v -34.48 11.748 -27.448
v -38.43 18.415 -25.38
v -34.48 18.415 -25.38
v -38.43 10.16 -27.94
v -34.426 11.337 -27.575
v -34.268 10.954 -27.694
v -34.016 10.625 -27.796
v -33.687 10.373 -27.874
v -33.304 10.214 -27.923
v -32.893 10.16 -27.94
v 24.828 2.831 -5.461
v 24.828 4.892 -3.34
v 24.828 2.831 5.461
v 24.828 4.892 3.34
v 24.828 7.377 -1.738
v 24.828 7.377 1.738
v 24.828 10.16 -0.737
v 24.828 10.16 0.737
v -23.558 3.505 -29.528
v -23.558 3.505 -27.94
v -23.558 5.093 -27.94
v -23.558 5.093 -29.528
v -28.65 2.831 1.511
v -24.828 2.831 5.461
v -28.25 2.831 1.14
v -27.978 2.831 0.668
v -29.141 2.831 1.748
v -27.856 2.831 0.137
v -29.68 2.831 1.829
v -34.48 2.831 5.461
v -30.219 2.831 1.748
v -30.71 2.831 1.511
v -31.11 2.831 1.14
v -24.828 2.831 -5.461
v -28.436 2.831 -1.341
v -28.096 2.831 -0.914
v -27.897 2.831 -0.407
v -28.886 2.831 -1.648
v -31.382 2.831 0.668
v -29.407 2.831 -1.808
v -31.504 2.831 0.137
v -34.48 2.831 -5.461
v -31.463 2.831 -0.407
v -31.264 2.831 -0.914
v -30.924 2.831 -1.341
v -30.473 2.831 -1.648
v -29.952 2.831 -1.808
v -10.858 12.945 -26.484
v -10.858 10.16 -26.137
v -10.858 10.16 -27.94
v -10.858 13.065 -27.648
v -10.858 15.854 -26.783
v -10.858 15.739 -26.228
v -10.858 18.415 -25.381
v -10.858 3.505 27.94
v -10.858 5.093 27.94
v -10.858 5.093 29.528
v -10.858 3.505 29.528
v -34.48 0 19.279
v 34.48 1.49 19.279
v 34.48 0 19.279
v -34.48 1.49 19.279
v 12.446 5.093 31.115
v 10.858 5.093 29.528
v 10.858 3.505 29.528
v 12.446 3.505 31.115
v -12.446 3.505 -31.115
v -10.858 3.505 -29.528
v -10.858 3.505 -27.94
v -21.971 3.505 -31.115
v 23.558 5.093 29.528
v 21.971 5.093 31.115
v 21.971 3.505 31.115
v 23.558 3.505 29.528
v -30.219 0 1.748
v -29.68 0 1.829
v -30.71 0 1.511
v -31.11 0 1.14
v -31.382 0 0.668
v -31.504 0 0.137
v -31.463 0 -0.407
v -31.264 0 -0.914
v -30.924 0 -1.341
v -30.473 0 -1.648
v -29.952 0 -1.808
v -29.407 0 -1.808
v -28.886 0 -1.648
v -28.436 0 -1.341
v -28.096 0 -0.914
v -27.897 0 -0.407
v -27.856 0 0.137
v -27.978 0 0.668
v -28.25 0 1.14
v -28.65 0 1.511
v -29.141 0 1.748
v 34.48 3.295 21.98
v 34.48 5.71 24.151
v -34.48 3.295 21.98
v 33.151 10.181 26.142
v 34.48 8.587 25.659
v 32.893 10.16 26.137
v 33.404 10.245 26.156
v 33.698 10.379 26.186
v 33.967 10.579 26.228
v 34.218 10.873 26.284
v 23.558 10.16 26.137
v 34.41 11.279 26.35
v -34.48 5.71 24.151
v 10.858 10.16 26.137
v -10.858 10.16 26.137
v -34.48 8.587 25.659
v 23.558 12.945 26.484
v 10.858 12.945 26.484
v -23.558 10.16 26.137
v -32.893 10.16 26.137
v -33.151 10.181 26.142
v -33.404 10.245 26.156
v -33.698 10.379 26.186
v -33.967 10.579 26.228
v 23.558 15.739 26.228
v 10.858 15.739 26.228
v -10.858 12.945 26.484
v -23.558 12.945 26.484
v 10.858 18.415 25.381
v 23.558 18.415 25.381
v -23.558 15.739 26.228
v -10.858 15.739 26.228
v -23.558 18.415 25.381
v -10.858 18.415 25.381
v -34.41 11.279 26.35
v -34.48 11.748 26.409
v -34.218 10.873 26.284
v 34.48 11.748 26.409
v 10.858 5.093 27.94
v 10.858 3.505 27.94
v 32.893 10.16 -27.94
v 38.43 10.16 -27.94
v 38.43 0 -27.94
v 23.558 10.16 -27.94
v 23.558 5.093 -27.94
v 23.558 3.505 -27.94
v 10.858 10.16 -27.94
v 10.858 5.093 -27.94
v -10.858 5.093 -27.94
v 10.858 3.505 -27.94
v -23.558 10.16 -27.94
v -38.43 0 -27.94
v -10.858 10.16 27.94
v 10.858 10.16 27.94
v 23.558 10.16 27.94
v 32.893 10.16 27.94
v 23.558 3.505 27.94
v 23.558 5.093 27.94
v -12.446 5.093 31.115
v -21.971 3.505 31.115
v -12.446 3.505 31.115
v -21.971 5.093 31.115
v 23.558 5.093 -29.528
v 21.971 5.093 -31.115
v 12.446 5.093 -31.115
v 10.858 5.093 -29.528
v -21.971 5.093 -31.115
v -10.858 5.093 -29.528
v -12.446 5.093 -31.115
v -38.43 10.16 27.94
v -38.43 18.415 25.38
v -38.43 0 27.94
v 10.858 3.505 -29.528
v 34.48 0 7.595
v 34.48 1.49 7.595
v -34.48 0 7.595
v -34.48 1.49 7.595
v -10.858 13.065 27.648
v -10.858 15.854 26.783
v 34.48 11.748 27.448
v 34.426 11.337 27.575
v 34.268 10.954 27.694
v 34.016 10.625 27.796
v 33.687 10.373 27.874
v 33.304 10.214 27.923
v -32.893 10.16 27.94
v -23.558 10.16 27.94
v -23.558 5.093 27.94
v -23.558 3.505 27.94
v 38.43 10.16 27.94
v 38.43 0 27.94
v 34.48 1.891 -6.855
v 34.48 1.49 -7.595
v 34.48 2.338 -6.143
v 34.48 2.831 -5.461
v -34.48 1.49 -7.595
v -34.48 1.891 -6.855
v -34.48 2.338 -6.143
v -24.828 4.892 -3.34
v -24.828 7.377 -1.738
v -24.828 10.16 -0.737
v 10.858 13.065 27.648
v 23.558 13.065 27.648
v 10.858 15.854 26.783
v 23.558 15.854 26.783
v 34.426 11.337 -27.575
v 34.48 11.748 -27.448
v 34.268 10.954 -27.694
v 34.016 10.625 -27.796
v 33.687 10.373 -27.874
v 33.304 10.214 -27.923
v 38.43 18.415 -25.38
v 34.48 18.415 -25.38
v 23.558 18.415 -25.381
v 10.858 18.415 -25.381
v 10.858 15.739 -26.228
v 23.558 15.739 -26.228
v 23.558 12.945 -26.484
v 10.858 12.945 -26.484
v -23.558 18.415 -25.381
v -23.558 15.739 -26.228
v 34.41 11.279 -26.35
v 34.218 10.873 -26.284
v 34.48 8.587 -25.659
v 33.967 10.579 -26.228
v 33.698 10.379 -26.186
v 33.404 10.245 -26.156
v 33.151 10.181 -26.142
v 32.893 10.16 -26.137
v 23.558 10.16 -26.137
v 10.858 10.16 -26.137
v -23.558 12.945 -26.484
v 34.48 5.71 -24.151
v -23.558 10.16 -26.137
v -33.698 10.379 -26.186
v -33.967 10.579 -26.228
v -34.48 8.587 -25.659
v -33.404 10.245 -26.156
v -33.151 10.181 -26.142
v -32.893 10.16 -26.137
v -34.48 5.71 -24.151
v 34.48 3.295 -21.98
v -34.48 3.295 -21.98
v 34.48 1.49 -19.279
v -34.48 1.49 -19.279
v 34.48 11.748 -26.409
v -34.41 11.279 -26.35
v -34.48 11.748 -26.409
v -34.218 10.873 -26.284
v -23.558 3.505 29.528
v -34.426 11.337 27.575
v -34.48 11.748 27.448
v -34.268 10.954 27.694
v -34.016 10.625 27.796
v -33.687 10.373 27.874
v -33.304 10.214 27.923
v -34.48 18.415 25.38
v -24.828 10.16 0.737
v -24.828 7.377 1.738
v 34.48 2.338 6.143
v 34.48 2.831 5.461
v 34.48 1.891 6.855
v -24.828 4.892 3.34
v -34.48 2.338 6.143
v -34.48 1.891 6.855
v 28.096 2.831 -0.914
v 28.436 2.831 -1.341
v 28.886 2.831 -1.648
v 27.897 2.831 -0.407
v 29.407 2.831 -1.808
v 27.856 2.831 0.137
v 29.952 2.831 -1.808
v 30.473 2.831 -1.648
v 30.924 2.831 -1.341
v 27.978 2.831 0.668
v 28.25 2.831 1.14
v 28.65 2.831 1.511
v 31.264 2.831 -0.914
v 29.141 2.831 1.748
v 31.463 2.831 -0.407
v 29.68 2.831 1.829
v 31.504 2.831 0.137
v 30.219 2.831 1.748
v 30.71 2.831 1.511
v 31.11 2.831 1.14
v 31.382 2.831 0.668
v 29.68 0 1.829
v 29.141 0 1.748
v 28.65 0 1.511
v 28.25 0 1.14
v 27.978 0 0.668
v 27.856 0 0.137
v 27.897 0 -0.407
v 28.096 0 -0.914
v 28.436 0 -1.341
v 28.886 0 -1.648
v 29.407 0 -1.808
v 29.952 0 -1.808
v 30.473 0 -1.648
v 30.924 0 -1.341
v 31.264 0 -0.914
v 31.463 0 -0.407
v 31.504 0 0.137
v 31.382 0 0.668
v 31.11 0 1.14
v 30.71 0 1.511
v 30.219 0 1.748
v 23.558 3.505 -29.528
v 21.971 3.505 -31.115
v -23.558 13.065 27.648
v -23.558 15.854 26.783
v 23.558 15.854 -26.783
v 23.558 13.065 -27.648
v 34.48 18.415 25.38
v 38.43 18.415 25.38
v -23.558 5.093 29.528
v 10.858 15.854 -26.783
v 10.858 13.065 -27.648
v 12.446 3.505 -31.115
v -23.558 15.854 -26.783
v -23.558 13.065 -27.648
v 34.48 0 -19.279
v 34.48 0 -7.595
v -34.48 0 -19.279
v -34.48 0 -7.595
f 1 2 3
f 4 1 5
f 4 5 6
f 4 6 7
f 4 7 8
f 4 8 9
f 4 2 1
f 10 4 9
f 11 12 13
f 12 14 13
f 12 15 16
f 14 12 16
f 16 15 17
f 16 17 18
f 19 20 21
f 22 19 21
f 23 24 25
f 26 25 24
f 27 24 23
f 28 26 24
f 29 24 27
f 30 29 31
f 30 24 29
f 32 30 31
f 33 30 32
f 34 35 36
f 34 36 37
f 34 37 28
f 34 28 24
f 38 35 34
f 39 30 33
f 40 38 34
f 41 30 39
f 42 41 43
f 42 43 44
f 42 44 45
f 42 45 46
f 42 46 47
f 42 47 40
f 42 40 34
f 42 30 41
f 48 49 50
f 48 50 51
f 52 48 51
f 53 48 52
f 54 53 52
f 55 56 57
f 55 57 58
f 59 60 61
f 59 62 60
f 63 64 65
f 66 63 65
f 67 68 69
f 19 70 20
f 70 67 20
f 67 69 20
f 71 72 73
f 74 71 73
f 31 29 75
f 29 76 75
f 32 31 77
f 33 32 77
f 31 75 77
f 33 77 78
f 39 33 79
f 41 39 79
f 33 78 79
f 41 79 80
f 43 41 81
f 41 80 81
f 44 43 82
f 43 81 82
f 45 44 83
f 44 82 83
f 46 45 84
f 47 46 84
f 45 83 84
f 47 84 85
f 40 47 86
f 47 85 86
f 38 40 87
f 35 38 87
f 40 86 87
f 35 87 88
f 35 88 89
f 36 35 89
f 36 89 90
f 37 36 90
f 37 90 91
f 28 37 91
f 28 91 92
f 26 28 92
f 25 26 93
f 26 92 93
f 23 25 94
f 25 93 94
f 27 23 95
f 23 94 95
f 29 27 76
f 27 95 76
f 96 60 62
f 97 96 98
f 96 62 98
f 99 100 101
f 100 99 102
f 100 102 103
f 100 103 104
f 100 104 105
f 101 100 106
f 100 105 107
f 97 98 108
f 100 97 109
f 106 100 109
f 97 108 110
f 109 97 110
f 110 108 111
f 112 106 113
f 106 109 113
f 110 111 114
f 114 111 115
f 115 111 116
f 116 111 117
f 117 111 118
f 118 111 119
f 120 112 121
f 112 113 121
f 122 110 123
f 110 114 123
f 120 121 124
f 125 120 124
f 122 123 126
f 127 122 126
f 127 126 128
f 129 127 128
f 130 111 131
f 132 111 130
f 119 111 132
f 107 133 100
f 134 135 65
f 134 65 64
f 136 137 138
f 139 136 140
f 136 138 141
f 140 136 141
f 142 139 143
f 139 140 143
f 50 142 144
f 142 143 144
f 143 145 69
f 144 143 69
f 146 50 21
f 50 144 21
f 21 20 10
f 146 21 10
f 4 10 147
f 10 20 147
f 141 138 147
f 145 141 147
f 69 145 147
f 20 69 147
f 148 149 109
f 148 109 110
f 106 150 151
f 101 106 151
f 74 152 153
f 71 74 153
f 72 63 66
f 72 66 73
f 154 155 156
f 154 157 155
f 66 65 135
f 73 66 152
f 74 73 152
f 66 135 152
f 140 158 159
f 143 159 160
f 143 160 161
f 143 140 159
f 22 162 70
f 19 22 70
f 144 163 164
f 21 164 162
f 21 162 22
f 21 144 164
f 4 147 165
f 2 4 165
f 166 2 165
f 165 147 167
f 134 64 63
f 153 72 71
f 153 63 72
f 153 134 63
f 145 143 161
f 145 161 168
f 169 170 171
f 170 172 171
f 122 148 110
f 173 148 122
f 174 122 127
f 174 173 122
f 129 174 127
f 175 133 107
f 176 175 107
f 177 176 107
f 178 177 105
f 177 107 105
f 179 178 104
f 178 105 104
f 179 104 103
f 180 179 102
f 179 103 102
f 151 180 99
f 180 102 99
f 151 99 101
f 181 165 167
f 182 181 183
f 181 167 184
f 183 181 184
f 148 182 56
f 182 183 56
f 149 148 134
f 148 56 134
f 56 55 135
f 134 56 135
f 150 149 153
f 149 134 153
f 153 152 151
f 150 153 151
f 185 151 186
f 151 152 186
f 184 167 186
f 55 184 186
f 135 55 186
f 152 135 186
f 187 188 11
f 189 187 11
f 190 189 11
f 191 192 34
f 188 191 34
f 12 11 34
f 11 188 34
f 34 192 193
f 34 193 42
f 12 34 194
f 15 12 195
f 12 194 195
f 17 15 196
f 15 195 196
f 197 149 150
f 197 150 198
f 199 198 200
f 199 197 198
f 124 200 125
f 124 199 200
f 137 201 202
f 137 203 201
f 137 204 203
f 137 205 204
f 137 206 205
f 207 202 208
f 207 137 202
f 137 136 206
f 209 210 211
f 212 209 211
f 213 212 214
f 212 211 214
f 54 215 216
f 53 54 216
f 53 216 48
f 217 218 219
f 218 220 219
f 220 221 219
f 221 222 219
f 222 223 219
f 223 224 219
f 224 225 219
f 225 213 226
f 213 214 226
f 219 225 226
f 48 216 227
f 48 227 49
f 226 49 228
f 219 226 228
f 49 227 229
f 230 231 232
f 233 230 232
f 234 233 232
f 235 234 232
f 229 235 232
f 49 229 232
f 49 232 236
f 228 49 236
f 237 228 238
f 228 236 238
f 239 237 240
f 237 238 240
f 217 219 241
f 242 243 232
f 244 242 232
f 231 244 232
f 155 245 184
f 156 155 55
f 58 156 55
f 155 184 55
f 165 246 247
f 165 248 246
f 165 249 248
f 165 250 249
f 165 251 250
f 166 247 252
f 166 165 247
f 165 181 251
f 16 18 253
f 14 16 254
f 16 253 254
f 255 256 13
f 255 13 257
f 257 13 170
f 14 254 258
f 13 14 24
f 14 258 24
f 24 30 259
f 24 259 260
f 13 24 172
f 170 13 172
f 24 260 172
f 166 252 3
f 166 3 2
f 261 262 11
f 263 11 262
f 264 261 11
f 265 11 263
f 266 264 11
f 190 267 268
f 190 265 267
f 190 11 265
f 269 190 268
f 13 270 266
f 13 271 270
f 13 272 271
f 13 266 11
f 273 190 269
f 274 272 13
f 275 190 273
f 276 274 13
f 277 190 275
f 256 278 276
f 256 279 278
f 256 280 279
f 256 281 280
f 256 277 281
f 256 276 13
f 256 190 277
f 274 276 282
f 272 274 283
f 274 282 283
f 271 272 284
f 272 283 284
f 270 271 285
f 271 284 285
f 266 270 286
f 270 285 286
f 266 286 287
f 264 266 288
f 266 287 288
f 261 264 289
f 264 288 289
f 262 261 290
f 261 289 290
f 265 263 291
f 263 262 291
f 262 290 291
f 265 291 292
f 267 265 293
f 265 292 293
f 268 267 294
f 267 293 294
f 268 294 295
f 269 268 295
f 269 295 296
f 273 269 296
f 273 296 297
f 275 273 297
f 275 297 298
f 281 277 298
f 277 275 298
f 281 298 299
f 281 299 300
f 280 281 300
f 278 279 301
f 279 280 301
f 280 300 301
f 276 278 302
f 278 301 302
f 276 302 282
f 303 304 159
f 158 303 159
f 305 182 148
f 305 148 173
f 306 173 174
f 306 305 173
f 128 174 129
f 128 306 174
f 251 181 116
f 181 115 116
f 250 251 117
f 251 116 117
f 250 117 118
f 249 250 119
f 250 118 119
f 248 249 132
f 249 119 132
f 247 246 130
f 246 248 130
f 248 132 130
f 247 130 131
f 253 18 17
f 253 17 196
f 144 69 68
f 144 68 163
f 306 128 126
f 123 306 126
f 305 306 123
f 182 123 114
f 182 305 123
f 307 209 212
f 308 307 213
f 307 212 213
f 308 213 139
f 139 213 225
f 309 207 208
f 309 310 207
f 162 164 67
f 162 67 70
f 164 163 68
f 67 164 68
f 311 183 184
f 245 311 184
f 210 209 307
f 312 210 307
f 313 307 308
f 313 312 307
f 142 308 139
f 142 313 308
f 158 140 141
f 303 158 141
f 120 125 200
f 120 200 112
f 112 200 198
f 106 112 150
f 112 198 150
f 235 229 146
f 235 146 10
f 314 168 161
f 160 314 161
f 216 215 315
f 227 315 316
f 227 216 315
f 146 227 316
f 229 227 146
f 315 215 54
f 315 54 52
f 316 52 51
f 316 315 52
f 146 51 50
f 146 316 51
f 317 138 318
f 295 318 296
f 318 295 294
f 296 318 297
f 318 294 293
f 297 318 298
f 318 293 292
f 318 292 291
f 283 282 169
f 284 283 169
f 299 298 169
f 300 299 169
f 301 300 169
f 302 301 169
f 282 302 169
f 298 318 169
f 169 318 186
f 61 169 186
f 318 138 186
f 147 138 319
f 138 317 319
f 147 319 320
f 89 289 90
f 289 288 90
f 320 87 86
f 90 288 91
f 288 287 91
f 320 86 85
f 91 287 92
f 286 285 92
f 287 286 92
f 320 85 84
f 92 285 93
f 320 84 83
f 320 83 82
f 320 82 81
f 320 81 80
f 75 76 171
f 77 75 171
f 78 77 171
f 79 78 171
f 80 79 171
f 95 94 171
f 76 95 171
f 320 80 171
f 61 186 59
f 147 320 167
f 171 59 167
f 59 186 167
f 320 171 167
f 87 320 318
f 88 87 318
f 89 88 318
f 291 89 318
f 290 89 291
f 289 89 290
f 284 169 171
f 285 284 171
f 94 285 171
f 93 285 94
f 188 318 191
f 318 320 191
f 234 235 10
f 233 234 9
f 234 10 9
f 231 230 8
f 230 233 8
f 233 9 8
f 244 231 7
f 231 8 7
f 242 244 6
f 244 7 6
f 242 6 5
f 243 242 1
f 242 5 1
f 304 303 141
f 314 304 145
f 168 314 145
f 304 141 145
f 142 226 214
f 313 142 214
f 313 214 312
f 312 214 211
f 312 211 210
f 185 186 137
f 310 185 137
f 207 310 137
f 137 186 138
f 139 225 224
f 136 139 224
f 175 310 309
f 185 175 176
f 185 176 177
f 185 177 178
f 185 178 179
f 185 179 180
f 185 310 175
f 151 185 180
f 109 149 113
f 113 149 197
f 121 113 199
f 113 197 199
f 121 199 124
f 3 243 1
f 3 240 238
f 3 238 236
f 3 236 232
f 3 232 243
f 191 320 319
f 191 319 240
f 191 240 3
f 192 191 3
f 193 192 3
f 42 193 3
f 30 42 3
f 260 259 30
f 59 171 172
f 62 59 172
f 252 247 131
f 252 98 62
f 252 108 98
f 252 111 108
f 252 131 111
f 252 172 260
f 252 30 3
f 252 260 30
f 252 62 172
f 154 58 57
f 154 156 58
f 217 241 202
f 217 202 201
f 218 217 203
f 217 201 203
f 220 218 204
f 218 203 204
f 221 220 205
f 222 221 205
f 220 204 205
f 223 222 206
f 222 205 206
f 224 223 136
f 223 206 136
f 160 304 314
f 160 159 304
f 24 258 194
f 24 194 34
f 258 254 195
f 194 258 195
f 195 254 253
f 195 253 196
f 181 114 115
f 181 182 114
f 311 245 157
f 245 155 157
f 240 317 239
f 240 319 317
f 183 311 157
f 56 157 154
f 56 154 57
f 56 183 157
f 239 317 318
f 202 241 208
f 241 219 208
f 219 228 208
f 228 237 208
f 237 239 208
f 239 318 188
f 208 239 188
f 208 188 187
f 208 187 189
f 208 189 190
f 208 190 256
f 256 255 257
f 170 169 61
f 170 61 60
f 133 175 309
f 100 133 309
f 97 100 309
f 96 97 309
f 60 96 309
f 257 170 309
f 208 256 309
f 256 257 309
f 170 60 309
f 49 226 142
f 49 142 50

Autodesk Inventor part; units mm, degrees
ref_plane "YZ Plane" through (0, 0, 0) normal (1, 0, 0) x (0, 1, 0)
sketch "Sketch1" plane through (0, 0, 0) normal (0, 1, 0) x (-1, 0, 0)
  line L0 (38.4302, 27.94) -> (-38.4302, 27.94)
  line L1 (-38.4302, 27.94) -> (-38.4302, -27.94)
  line L2 (-38.4302, -27.94) -> (38.4302, -27.94)
  line L3 (38.4302, -27.94) -> (38.4302, 27.94)
  line L4 (53.8023, 0) -> (-53.8023, 0) construction
  line L5 (0, -39.116) -> (0, 39.116) construction
  point P0 (0, 0)
  point P1 (0, 27.94)
  point P2 (38.4302, 0)
  dimension "d0" = 76.8604
  dimension "d1" = 55.88
extrude "Extrusion1" add sketch "Sketch1" along normal blind 18.415
ref_plane "Work Plane1" through (0, 0, 27.94) normal (1, 0, 0) x (0, 0, -1)
sketch "Sketch2" plane through (0, 0, 27.94) normal (1, 0, 0) x (0, 0, -1)
  line L0 (27.94, -6.8898) -> (27.94, 29.6482) construction
  line L1 (67.056, 0) -> (-11.176, 0) construction
  circle A0 centre (14.5034, 13.1588) radius 13.0493
  circle A1 centre (41.3766, 13.1588) radius 13.0493
  line L2 (1.8034, 10.16) -> (27.2034, 10.16) construction
  point P0 (27.94, 0)
  dimension "d4" = 13.4366
  dimension "d6" = 26.0985
  dimension "d11" = 25.4
  dimension "d12" = 10.16
extrude "Extrusion2" cut sketch "Sketch2" along normal mid plane 68.961
sketch "Sketch3" plane through (-38.4302, 0, 27.94) normal (0, 0, 1) x (1, 0, 0)
  line L0 (0, 18.415) -> (76.8604, 18.415) construction
  line L1 (3.9497, 18.415) -> (3.9497, 0.1096) construction
  line L2 (3.9497, 18.415) -> (14.8717, 18.415)
  line L3 (14.8717, 18.415) -> (14.8717, 10.16)
  line L4 (14.8717, 10.16) -> (3.9497, 10.16)
  line L5 (3.9497, 10.16) -> (3.9497, 18.415)
  line L6 (27.5717, 18.415) -> (38.4302, 18.415)
  line L7 (27.5717, 10.16) -> (27.5717, 18.415)
  line L8 (-15.3721, 0) -> (92.2325, 0) construction
  line L9 (27.5717, 10.16) -> (38.4302, 10.16)
  line L10 (38.4302, -3.683) -> (38.4302, 22.098) construction
  line L11 (72.9107, 18.415) -> (61.9887, 18.415)
  line L12 (61.9887, 18.415) -> (61.9887, 10.16)
  line L13 (61.9887, 10.16) -> (72.9107, 10.16)
  line L14 (72.9107, 10.16) -> (72.9107, 18.415)
  line L15 (49.2887, 18.415) -> (38.4302, 18.415)
  line L16 (49.2887, 10.16) -> (49.2887, 18.415)
  line L17 (49.2887, 10.16) -> (38.4302, 10.16)
  point P0 (38.4302, 0)
  dimension "d13" = 10.922
  dimension "d16" = 10.16
  dimension "d17" = 12.7
extrude "Extrusion3" cut sketch "Sketch3" against normal through all
sketch "Sketch4" plane through (-34.4805, 0, 27.94) normal (1, 0, 0) x (0, 0, -1)
  line L0 (27.2034, 10.16) -> (28.6766, 10.16) projected
  arc A0 (27.2034, 10.16) -> (26.4472, 18.415) centre (14.5034, 13.1588) ccw projected
  arc A1 (29.4328, 18.415) -> (28.6766, 10.16) centre (41.3766, 13.1588) ccw projected
  line L1 (29.4328, 18.415) -> (26.4472, 18.415) projected
  line L2 (0, 18.415) -> (2.5596, 18.415) projected
  arc A2 (2.5596, 18.415) -> (0, 10.16) centre (14.5917, 10.16) ccw
  line L3 (0, 18.415) -> (55.88, 18.415) construction
  line L4 (0, 10.16) -> (0, 18.415)
  line L5 (0, 18.415) -> (2.5596, 18.415)
  line L6 (27.94, -3.7218) -> (27.94, 22.3306) construction
  line L7 (55.88, 18.415) -> (53.3204, 18.415)
  arc A3 (55.88, 10.16) -> (53.3204, 18.415) centre (41.2883, 10.16) ccw
  line L8 (55.88, 10.16) -> (55.88, 18.415)
  line L9 (55.88, 18.415) -> (53.3204, 18.415)
  point P0 (27.94, 0)
  point P1 (0, 0)
  dimension "d21" = 14.5917
extrude "Extrusion4" cut sketch "Sketch4" along normal up to surface (68.961 mm away)
sketch "Sketch5" plane through (-34.4805, 0, 27.94) normal (1, 0, 0) x (0, 0, -1)
  arc A0 (1.8034, 10.16) -> (27.2034, 10.16) centre (14.5034, 13.1588) ccw construction
  arc A1 (28.6766, 10.16) -> (54.0766, 10.16) centre (41.3766, 13.1588) ccw construction
  line L0 (27.2034, 10.16) -> (28.6766, 10.16) projected
  line L1 (22.479, 2.8306) -> (33.401, 2.8306)
  arc A2 (22.479, 2.8306) -> (27.2034, 10.16) centre (14.5034, 13.1588) ccw
  arc A3 (28.6766, 10.16) -> (33.401, 2.8306) centre (41.3766, 13.1588) ccw
  point P0 (27.94, 0)
  dimension "d24" = 10.922
extrude "Extrusion5" cut sketch "Sketch5" along normal blind 9.652
mirror "Mirror1" about plane through (0, 0, 27.94) normal (1, 0, 0) of "Extrusion5"
sketch "Sketch6" plane through (-34.4805, 0, 27.94) normal (1, 0, 0) x (0, 0, -1)
  arc A0 (1.8034, 10.16) -> (22.479, 2.8306) centre (14.5034, 13.1588) ccw construction
  line L0 (55.88, 0) -> (0, 0) construction
  line L1 (8.6614, 1.4903) -> (8.6614, 0)
  line L2 (14.5034, 13.1588) -> (14.5034, 0) construction
  line L3 (20.3454, 1.4903) -> (20.3454, 0)
  arc A1 (8.6614, 1.4903) -> (20.3454, 1.4903) centre (14.5034, 13.1588) ccw
  line L4 (8.6614, 0) -> (20.3454, 0)
  point P0 (27.94, 0)
  dimension "d27" = 5.842
extrude "Extrusion6" cut sketch "Sketch6" along normal up to surface (68.961 mm away)
ref_plane "Work Plane2" through (-38.4302, 0, 0) normal (0, 0, 1) x (1, 0, 0)
mirror "Mirror2" about plane through (-38.4302, 0, 0) normal (0, 0, 1) of "Extrusion6"
sketch "Sketch7" plane through (38.4302, 0, 27.94) normal (1, 0, 0) x (0, 0, -1)
  line L0 (0, 0) -> (0, 18.415) construction
  line L1 (0, 18.415) -> (55.88, 18.415) construction
  arc A0 (2.5596, 18.415) -> (0, 10.16) centre (14.5917, 10.16) ccw construction
  line L2 (2.5596, 18.415) -> (0, 10.16)
  line L3 (2.5596, 18.415) -> (0, 18.415)
  line L4 (0, 10.16) -> (0, 18.415)
  point P0 (27.94, 0)
extrude "Extrusion7" cut sketch "Sketch7" against normal up to surface (3.9497 mm away)
mirror "Mirror3" about plane through (-38.4302, 0, 0) normal (0, 0, 1) of "Extrusion7"
mirror "Mirror4" about plane through (0, 0, 27.94) normal (1, 0, 0) of "Extrusion7", "Mirror3"
fillet "Fillet1" radius 1.5875 4 edges at (-34.4805, 10.16, -27.0383) (-34.4805, 10.16, 27.0383) (34.4805, 10.16, -27.0383) (34.4805, 10.16, 27.0383)
sketch "Sketch9" plane through (-38.4302, 0, 27.94) normal (0, 0, 1) x (1, 0, 0)
  line L0 (27.5717, 10.16) -> (27.5717, 18.415) construction
  line L1 (14.8717, 18.415) -> (14.8717, 10.16) construction
  line L2 (0, 0) -> (76.8604, 0) construction
  line L3 (14.8717, 5.0927) -> (14.8717, 3.5052)
  line L4 (27.5717, 5.0927) -> (27.5717, 3.5052)
  line L5 (14.8717, 5.0927) -> (27.5717, 5.0927)
  line L6 (14.8717, 3.5052) -> (27.5717, 3.5052)
  point P0 (38.4302, 0)
  dimension "d33" = 3.5052
  dimension "d34" = 1.5875
  dimension "d36" = 12.7
  dimension "d37" = 12.7
extrude "Extrusion8" add sketch "Sketch9" along normal blind 3.175
mirror "Mirror5" about plane through (0, 0, 27.94) normal (1, 0, 0) of "Extrusion8"
mirror "Mirror6" about plane through (-38.4302, 0, 0) normal (0, 0, 1) of "Extrusion8", "Mirror5"
chamfer "Chamfer1" distance 1.5875 angle 45 8 edges at (-10.8585, 4.299, 31.115) (23.5585, 4.2989, 31.115) (10.8585, 4.299, 31.115) (-23.5585, 4.2989, 31.115) (-10.8585, 4.299, -31.115) (-23.5585, 4.2989, -31.115) (23.5585, 4.2989, -31.115) (10.8585, 4.299, -31.115)
sketch "Sketch10" plane through (-34.4805, 2.8306, 5.461) normal (0, 1, 0) x (1, 0, 0)
  line L0 (-19.3218, 5.461) -> (88.2828, 5.461) construction
  line L1 (34.4805, 49.022) -> (34.4805, -38.1) construction
  point P0 (34.4805, 5.461)
  point P1 (4.8006, 5.461)
  dimension "d43" = 29.6799
hole "Hole1" at (-29.6799, 2.8306, 0) direction (0, -1, 0) diameter 3.6576 end through all
mirror "Mirror7" about plane through (0, 0, 27.94) normal (1, 0, 0) of "Hole1"
properties part number "Keystone-26650-Dual-Battery-Holder[DWG-1109]" material "Thermoplastic Resin"
